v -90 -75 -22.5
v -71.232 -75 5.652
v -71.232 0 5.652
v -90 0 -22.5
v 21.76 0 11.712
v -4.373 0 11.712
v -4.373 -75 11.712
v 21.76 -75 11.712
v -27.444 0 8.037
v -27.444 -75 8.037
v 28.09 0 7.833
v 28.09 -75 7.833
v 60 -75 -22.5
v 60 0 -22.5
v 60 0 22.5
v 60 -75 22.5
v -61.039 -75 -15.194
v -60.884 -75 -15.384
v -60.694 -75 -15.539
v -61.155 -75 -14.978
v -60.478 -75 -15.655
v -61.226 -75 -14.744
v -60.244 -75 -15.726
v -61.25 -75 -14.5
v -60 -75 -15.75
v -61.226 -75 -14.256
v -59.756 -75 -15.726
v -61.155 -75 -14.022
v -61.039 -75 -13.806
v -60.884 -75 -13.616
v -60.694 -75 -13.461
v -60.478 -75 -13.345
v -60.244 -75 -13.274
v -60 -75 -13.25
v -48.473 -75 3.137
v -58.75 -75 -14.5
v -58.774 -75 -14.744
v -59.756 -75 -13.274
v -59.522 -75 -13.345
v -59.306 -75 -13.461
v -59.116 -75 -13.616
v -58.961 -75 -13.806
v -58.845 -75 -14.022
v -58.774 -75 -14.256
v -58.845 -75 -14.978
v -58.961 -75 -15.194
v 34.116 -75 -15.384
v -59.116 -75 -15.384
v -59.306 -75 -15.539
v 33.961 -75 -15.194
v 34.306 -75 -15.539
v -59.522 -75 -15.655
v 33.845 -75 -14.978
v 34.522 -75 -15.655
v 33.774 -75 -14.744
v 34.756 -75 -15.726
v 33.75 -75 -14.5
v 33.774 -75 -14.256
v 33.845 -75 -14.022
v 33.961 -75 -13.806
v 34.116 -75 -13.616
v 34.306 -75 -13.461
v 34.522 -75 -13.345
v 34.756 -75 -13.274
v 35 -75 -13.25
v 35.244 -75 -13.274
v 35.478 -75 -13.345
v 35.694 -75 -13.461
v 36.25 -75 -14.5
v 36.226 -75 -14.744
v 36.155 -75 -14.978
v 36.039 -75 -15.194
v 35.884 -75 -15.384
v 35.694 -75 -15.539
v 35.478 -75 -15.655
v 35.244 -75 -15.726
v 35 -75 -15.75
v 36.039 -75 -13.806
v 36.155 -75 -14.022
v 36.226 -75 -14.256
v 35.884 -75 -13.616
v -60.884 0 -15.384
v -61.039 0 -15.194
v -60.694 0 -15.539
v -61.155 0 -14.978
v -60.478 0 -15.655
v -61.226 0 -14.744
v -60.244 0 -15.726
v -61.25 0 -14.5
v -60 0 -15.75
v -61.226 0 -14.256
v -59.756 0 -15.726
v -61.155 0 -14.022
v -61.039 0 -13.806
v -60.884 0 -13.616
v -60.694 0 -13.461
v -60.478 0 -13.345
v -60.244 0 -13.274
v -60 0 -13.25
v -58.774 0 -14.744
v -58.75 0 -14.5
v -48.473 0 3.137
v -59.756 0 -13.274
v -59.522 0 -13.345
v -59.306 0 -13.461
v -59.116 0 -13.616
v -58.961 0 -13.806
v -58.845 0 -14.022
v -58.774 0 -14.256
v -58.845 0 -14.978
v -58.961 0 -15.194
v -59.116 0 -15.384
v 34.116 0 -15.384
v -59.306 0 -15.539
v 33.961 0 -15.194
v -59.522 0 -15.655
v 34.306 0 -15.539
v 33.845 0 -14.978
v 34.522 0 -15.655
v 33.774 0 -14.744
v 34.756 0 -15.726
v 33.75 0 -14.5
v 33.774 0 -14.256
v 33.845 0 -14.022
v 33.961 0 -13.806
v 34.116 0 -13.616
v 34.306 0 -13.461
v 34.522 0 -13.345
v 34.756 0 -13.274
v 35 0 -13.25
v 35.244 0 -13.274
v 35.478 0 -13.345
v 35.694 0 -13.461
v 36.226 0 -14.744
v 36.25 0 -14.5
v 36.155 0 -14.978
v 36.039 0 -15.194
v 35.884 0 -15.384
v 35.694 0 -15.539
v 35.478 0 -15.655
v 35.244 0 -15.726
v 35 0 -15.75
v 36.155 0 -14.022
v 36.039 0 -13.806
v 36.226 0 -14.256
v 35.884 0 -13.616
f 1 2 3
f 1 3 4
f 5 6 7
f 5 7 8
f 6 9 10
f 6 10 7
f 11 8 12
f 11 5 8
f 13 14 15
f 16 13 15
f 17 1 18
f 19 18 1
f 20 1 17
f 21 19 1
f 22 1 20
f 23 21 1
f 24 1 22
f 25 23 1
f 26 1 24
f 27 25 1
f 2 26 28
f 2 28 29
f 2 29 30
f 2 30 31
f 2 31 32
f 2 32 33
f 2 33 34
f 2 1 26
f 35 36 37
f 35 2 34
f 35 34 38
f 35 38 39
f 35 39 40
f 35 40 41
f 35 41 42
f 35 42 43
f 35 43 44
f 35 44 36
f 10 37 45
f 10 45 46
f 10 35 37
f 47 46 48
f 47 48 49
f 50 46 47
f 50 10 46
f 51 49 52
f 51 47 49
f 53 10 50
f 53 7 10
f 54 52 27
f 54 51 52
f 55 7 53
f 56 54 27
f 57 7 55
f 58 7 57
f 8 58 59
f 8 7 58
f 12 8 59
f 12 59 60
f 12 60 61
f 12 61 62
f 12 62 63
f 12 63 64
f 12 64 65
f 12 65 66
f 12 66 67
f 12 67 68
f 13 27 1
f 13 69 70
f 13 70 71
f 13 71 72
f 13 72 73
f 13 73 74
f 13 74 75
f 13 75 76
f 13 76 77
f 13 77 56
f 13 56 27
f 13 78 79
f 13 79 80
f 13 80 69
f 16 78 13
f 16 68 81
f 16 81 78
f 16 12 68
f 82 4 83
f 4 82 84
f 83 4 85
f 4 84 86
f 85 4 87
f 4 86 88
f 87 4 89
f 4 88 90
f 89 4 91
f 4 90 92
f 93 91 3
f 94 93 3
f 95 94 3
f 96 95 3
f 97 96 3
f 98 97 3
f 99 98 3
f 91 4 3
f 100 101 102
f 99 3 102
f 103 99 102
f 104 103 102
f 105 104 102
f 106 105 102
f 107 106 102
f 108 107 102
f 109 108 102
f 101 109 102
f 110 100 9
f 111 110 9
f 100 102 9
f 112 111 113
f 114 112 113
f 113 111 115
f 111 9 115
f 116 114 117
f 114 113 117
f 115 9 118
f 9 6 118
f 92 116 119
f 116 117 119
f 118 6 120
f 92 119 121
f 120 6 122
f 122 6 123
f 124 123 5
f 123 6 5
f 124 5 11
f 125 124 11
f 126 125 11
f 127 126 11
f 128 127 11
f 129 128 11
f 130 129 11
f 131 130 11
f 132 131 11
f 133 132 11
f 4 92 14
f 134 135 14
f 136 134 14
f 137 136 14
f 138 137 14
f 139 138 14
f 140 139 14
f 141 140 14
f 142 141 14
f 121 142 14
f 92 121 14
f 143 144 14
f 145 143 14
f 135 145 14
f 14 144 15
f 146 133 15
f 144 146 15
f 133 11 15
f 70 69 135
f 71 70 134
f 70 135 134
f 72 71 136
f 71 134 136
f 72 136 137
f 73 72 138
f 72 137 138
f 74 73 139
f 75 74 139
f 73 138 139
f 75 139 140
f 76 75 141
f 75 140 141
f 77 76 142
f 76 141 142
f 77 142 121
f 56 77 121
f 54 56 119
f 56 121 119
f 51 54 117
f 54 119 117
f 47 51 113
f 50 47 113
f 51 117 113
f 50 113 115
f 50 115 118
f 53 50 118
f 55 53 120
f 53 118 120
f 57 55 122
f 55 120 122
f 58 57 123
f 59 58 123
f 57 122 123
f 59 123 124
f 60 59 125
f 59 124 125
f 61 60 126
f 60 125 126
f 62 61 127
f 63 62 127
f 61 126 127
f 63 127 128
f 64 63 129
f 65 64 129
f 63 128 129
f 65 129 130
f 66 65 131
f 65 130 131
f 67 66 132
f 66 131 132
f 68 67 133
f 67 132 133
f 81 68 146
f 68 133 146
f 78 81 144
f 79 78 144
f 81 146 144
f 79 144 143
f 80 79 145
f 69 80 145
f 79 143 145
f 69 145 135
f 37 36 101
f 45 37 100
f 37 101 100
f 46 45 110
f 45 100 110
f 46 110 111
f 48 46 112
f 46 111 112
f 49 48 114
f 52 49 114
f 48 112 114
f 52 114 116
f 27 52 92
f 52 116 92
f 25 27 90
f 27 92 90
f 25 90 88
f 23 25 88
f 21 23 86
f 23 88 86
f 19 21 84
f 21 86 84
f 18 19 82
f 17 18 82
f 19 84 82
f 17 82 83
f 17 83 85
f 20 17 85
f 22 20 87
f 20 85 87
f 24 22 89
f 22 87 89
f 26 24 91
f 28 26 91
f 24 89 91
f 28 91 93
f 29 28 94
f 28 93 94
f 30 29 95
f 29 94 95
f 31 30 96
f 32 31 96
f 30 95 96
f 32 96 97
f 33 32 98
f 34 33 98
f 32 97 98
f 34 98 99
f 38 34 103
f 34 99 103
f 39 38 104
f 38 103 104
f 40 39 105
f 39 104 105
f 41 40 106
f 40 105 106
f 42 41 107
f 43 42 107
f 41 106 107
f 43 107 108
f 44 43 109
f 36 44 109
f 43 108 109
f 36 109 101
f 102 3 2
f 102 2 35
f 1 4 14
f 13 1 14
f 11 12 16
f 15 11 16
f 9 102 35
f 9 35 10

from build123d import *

# Parameters (mm, degrees)
F1_DEPTH = 25
F2_DEPTH = 50
F3_DEPTH = 25
F5_DEPTH = 25
F6_DEPTH = 50.001
F7_DEPTH = 25


with BuildPart() as f1:
    # F0 (on Front) → F1 (new body)
    with BuildSketch(Plane.XZ):
        Polygon((60.0000005501, 22.5), (-59.9999994499, 22.5), (-90.0000005501, -22.5), (-60.0000005501, -22.5), (34.9999994499, -22.5), (59.9999994499, -22.5), align=None)
        with BuildLine():
            ThreePointArc((-60.0000005501, -15.75), (-60.8838840266, -13.6161165235), (-58.7500005501, -14.5))
            ThreePointArc((-58.7500005501, -14.5), (-59.1161170737, -15.3838834765), (-60.0000005501, -15.75))
        make_face(mode=Mode.SUBTRACT)
        with BuildLine():
            ThreePointArc((34.9999994499, -15.75), (34.1161159734, -13.6161165235), (36.2499994499, -14.5))
            ThreePointArc((36.2499994499, -14.5), (35.8838829263, -15.3838834765), (34.9999994499, -15.75))
        make_face(mode=Mode.SUBTRACT)
    extrude(amount=F1_DEPTH)

    # F0 (on Front) → F2 (join)
    with BuildSketch(Plane.XZ):
        Polygon((60.0000005501, 22.5), (-59.9999994499, 22.5), (-90.0000005501, -22.5), (-60.0000005501, -22.5), (34.9999994499, -22.5), (59.9999994499, -22.5), align=None)
        with BuildLine():
            ThreePointArc((-60.0000005501, -15.75), (-60.8838840266, -13.6161165235), (-58.7500005501, -14.5))
            ThreePointArc((-58.7500005501, -14.5), (-59.1161170737, -15.3838834765), (-60.0000005501, -15.75))
        make_face(mode=Mode.SUBTRACT)
        with BuildLine():
            ThreePointArc((34.9999994499, -15.75), (34.1161159734, -13.6161165235), (36.2499994499, -14.5))
            ThreePointArc((36.2499994499, -14.5), (35.8838829263, -15.3838834765), (34.9999994499, -15.75))
        make_face(mode=Mode.SUBTRACT)
    extrude(amount=F2_DEPTH)

    # F0 (on Front) → F3 (join)
    with BuildSketch(Plane.XZ):
        Polygon((60.0000005501, 22.5), (-59.9999994499, 22.5), (-90.0000005501, -22.5), (-60.0000005501, -22.5), (34.9999994499, -22.5), (59.9999994499, -22.5), align=None)
        with BuildLine():
            ThreePointArc((-60.0000005501, -15.75), (-60.8838840266, -13.6161165235), (-58.7500005501, -14.5))
            ThreePointArc((-58.7500005501, -14.5), (-59.1161170737, -15.3838834765), (-60.0000005501, -15.75))
        make_face(mode=Mode.SUBTRACT)
        with BuildLine():
            ThreePointArc((34.9999994499, -15.75), (34.1161159734, -13.6161165235), (36.2499994499, -14.5))
            ThreePointArc((36.2499994499, -14.5), (35.8838829263, -15.3838834765), (34.9999994499, -15.75))
        make_face(mode=Mode.SUBTRACT)
    extrude(amount=F3_DEPTH)

    # F4 (on face) → F5 (cut)
    with BuildSketch(Plane.XZ.offset(50)):
        Polygon((-59.9999994499, 22.5), (-71.2320403303, 5.6519392973), (-48.4728738666, 3.1374983955), (-27.4437088519, 8.0374982208), (-4.3728742748, 11.7124989629), (21.7604581267, 11.7124989629), (28.0896257609, 7.8333318233), (60.0000005501, 22.5), align=None)
    extrude(amount=-F5_DEPTH, mode=Mode.SUBTRACT)

    # F4 (on face) → F6 (cut, through all)
    with BuildSketch(Plane.XZ.offset(50)):
        Polygon((-59.9999994499, 22.5), (-71.2320403303, 5.6519392973), (-48.4728738666, 3.1374983955), (-27.4437088519, 8.0374982208), (-4.3728742748, 11.7124989629), (21.7604581267, 11.7124989629), (28.0896257609, 7.8333318233), (60.0000005501, 22.5), align=None)
    extrude(amount=-F6_DEPTH, mode=Mode.SUBTRACT)

    # F7 (add): a face of the model
    f7_faces = [f1.faces().sort_by_distance(p)[0] for p in [
        (-5.3315876284, -50, -6.3878116197),
    ]]
    extrude(f7_faces, amount=F7_DEPTH)


solid = f1.part
